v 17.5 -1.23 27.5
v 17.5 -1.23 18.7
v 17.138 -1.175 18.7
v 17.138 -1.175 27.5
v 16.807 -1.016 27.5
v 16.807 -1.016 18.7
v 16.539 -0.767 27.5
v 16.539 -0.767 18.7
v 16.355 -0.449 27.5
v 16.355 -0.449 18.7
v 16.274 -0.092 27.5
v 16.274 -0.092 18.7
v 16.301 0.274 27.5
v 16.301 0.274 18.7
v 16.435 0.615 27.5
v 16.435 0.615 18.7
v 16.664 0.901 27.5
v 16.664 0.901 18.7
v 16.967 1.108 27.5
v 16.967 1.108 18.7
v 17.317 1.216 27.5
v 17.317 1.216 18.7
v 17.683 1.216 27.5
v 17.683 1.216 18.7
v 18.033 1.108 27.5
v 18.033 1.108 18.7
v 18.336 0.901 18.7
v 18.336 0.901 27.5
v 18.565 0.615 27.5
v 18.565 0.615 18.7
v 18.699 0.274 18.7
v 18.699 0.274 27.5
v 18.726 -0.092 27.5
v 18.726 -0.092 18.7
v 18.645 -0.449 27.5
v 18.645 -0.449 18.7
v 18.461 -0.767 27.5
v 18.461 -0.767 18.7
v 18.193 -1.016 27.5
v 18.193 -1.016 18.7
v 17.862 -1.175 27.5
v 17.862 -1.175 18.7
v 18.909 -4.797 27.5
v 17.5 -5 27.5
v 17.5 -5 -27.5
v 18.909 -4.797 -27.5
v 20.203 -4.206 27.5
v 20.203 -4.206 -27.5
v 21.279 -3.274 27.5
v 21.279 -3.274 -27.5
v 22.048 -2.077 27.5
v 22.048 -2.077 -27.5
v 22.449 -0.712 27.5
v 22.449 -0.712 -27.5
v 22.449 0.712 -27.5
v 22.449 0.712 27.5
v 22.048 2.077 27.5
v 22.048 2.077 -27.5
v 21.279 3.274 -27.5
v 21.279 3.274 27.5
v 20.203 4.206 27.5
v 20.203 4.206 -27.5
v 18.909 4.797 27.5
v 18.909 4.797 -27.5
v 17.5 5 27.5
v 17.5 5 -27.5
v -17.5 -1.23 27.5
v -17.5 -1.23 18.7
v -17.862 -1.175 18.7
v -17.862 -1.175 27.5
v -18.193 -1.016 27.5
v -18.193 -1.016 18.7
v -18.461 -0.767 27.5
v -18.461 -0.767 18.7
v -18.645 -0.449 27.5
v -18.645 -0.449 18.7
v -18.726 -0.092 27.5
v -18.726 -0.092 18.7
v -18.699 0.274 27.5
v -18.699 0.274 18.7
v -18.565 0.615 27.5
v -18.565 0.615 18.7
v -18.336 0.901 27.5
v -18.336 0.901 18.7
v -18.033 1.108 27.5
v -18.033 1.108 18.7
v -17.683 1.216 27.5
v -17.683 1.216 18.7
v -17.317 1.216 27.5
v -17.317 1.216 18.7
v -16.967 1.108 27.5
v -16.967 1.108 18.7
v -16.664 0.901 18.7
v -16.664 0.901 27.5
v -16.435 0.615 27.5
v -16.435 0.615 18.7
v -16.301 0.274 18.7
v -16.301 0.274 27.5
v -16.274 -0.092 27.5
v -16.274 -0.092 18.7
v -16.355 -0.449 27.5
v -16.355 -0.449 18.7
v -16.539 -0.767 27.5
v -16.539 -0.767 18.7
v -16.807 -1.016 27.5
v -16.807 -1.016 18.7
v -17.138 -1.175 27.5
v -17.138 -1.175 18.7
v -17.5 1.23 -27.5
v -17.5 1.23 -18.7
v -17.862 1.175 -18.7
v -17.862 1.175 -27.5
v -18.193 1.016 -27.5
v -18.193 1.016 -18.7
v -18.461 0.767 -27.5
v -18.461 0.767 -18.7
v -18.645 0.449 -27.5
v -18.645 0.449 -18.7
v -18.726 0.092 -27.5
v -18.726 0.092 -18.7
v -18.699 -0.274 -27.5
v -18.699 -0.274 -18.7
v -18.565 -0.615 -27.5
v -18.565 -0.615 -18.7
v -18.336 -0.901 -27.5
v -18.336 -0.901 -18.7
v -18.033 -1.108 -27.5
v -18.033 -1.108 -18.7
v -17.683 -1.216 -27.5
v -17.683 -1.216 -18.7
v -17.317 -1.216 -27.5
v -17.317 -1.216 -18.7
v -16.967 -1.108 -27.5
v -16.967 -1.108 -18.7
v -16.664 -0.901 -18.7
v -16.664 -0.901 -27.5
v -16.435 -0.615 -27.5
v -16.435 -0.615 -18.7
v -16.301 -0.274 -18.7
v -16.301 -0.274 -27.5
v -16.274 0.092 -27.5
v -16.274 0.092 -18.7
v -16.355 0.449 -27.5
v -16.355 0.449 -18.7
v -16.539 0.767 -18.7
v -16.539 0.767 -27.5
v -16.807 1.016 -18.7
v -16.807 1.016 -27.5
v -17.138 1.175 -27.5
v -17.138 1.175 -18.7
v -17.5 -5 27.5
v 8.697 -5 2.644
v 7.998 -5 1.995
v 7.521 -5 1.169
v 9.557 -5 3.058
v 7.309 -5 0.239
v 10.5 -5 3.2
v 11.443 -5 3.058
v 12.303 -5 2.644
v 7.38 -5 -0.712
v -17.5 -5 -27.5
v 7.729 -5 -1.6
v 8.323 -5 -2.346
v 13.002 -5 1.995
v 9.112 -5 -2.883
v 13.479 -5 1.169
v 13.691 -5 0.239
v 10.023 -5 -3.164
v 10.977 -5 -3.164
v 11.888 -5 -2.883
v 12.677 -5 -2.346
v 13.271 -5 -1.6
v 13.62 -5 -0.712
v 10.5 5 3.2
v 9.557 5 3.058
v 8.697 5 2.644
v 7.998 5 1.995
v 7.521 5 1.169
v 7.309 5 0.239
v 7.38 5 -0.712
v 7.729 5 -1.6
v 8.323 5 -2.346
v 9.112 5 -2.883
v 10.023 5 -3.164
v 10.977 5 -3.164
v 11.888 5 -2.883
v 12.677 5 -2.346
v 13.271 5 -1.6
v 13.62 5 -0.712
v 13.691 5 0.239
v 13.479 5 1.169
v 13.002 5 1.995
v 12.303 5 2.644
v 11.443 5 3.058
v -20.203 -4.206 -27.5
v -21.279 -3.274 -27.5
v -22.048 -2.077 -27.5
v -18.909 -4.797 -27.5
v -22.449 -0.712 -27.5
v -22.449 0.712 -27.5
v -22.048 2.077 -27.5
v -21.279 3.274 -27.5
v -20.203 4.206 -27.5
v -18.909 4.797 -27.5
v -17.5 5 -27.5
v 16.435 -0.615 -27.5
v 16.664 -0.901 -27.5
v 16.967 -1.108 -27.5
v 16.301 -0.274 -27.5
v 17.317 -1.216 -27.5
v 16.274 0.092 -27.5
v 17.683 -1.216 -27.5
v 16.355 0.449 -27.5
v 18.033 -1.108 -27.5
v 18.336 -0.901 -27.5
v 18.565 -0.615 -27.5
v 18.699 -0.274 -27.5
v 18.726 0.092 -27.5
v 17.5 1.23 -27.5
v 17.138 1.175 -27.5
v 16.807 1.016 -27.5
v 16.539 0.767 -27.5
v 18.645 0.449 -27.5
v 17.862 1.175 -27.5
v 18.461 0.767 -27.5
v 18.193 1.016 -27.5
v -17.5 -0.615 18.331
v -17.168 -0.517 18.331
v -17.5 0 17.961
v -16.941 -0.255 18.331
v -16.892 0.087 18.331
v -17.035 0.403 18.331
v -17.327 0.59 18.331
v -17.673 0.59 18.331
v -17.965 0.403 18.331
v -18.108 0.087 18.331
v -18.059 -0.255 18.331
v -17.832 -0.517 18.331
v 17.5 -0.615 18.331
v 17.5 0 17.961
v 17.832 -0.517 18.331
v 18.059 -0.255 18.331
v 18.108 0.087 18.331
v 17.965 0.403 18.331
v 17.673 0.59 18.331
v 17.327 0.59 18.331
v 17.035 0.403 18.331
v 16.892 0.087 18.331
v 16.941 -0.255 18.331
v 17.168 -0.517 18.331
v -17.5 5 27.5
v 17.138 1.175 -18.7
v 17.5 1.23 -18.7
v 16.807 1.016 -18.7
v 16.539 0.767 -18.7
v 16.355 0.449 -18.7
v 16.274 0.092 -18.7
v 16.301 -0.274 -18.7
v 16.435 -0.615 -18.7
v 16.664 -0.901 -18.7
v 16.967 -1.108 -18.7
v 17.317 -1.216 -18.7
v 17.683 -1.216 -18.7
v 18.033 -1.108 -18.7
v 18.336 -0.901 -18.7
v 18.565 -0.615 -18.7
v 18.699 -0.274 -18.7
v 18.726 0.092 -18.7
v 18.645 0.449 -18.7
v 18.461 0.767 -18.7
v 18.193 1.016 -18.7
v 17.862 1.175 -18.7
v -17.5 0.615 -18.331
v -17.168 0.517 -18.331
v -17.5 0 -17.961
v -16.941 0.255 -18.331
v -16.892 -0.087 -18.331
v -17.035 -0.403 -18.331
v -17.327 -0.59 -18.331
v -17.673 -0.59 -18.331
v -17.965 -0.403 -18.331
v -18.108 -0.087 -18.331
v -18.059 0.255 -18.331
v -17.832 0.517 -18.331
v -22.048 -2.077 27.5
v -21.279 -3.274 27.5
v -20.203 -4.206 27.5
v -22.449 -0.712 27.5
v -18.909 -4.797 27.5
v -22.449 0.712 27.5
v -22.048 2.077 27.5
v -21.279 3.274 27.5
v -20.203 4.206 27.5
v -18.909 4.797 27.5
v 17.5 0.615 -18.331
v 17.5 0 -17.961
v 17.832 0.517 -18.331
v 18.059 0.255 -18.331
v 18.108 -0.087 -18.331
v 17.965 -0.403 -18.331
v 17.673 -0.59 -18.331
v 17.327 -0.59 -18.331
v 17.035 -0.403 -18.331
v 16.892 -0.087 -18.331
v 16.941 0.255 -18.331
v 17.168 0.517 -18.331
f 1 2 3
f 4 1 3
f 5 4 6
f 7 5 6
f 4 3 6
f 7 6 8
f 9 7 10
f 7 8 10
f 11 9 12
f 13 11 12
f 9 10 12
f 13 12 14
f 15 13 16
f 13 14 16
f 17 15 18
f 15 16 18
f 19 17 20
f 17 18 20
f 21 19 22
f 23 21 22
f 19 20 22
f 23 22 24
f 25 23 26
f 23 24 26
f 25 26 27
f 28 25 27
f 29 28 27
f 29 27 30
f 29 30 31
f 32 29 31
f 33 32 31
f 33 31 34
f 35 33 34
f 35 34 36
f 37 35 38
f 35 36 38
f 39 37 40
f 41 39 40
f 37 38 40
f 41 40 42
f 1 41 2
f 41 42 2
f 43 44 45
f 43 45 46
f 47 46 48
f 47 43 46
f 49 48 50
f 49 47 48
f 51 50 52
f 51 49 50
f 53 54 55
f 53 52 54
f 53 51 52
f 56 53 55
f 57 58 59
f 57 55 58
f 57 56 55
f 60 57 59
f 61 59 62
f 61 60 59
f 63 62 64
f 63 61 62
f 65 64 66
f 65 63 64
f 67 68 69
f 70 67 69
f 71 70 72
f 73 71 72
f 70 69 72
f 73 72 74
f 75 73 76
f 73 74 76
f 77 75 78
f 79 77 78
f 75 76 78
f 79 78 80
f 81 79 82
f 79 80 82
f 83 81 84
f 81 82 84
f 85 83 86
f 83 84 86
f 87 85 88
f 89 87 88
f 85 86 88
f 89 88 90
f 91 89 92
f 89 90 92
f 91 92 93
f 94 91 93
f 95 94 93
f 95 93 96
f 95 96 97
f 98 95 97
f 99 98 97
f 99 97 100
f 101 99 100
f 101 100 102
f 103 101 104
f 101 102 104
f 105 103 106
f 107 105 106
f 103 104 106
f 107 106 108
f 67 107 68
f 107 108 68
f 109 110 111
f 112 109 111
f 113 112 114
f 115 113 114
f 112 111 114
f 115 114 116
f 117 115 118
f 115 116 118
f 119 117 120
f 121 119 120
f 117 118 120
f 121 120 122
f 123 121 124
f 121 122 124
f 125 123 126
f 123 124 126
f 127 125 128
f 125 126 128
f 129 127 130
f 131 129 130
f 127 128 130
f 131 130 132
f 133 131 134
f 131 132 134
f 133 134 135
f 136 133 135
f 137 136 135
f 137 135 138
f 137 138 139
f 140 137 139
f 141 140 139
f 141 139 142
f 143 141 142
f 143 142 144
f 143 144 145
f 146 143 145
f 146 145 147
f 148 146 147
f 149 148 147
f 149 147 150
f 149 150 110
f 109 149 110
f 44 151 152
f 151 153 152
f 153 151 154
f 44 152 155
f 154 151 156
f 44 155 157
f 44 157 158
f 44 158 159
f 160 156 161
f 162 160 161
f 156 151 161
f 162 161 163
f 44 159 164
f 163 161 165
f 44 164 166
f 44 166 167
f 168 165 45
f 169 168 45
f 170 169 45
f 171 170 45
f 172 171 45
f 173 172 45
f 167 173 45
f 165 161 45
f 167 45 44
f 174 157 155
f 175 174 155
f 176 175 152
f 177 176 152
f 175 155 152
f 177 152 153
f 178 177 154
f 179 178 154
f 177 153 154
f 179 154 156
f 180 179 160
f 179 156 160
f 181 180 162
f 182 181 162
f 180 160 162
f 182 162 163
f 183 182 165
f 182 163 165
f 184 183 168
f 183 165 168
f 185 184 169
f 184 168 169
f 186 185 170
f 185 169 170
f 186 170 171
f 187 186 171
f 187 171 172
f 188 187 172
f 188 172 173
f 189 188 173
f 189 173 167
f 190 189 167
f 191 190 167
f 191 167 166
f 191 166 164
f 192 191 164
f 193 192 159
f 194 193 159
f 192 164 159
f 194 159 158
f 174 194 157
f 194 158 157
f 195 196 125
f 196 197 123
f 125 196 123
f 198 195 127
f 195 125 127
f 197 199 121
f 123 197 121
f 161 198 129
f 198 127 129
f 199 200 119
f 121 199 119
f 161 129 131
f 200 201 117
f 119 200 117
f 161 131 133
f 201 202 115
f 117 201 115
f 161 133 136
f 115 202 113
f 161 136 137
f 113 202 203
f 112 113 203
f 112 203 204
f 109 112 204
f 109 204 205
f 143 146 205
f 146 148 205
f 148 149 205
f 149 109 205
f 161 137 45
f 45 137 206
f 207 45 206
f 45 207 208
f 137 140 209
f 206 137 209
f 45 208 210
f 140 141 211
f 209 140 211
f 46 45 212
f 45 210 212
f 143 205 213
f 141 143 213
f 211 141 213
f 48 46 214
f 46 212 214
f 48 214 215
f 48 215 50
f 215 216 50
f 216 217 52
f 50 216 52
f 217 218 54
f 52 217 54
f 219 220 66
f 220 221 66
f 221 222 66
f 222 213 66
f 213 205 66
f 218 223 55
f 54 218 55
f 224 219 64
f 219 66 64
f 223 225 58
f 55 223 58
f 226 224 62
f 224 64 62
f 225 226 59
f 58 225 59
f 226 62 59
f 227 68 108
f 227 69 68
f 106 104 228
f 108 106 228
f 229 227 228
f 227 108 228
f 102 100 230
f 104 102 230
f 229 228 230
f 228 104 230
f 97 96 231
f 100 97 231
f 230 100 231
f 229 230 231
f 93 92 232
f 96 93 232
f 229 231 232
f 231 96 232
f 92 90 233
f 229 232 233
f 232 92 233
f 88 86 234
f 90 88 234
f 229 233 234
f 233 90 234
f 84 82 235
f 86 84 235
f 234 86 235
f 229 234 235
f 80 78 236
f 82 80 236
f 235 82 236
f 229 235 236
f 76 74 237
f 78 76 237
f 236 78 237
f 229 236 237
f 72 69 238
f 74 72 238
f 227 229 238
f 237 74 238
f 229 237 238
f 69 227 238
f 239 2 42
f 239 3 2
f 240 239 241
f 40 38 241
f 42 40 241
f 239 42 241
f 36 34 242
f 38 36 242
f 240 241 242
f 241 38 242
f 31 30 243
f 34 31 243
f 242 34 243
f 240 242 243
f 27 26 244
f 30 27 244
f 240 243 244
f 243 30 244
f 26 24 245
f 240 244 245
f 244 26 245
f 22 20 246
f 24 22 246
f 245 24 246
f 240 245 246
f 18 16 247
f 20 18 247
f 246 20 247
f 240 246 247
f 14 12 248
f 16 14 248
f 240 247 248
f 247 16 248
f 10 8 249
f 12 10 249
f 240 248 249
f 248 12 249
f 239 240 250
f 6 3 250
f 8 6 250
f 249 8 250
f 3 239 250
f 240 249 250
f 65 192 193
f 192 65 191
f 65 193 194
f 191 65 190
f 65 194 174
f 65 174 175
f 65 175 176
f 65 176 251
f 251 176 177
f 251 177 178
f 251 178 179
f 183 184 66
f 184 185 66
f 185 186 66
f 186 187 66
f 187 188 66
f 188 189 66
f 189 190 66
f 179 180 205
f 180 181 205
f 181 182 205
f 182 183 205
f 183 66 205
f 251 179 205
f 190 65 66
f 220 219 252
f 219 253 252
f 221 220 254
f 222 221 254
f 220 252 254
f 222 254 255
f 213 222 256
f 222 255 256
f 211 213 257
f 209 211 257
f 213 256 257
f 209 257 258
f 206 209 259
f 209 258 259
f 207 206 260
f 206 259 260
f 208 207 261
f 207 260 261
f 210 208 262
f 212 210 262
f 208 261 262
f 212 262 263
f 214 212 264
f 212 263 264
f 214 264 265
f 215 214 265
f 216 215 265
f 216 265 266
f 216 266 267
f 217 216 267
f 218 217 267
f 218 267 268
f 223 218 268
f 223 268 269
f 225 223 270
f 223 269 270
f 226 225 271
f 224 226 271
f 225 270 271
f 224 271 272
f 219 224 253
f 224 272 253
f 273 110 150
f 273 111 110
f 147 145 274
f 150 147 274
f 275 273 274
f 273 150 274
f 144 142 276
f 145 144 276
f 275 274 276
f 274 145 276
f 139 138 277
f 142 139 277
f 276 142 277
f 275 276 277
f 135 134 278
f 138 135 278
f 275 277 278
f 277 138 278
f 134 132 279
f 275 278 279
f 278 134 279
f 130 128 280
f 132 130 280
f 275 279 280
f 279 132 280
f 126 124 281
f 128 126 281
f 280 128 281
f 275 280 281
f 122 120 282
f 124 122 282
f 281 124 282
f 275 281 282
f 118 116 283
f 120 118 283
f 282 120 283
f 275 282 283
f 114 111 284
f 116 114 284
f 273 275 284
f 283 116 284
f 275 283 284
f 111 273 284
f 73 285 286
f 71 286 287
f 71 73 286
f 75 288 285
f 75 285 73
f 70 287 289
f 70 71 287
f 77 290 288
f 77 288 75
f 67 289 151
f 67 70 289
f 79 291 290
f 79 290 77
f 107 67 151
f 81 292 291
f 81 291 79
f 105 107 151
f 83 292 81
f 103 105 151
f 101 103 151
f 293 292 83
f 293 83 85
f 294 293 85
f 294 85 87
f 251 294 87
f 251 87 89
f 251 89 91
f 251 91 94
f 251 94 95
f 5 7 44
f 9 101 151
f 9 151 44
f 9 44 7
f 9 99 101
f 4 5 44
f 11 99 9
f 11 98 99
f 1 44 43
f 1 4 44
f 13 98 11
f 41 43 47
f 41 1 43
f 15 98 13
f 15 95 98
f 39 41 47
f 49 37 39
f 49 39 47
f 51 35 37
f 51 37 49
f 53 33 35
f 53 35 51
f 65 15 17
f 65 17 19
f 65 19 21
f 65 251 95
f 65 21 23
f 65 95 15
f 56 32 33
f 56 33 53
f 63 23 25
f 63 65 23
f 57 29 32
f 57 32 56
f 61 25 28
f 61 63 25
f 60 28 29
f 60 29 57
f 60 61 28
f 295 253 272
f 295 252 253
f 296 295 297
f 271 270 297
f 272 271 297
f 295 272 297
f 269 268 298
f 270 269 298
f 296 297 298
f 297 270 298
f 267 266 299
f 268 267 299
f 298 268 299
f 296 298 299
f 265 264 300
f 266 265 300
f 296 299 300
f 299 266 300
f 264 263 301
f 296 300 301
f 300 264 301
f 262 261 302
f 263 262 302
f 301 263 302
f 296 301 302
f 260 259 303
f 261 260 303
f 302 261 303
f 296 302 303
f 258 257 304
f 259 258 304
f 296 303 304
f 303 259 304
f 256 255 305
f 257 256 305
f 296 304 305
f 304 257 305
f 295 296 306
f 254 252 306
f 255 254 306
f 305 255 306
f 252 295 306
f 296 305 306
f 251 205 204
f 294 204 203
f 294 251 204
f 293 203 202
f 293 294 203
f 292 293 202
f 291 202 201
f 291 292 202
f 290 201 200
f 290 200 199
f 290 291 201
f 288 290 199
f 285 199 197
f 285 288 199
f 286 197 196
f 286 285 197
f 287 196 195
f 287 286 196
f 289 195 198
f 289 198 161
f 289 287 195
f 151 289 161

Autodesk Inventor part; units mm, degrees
ref_plane "YZ Plane" through (0, 0, 0) normal (1, 0, 0) x (0, 1, 0)
ref_plane "XZ Plane" through (0, 0, 0) normal (0, 1, 0) x (-1, 0, 0)
ref_plane "XY Plane" through (0, 0, 0) normal (0, 0, 1) x (1, 0, 0)
sketch "スケッチ1" plane through (0, 0, 0) normal (0, 0, 1) x (1, 0, 0)
  line L0 (-22.5, -5) -> (22.5, -5)
  line L1 (22.5, -5) -> (22.5, 5)
  line L2 (22.5, 5) -> (-22.5, 5)
  line L3 (-22.5, 5) -> (-22.5, -5)
  line L4 (-22.5, -5) -> (22.5, 5) construction
  line L5 (22.5, -5) -> (-22.5, 5) construction
  point P0 (0, 0)
  dimension "d0" = 45
  dimension "d1" = 10
extrude "押し出し1" add sketch "スケッチ1" along normal mid plane 55
sketch "スケッチ2" plane through (0, 0, 27.5) normal (0, 0, 1) x (1, 0, 0)
  line L0 (22.5, 5) -> (-22.5, 5) projected
  line L1 (-22.5, 5) -> (-22.5, -5) projected
  line L2 (22.5, -5) -> (22.5, 5) projected
  point P0 (0, 0)
  point P1 (-17.5, 0)
  point P2 (17.5, 0)
  dimension "d4" = 5
  dimension "d5" = 5
  dimension "d6" = 5
  dimension "d7" = 5
hole "穴1" at (-17.5, 0, 27.5) at (17.5, 0, 27.5) direction (0, 0, -1) diameter 2.459 depth 8.8 tip angle 118 thread size "M3x0.5" class "6H" standard "ISO Metric profile"
sketch "スケッチ3" plane through (0, 0, -27.5) normal (0, 0, -1) x (-1, 0, 0)
  line L0 (-22.5, 5) -> (-22.5, -5) projected
  line L1 (-22.5, -5) -> (22.5, -5) projected
  line L2 (22.5, -5) -> (22.5, 5) projected
  line L3 (22.5, 5) -> (-22.5, 5) projected
  circle A0 centre (-17.5, 0) radius 1.2295 projected
  circle A1 centre (17.5, 0) radius 1.2295 projected
  point P0 (0, 0)
hole "穴2" at (17.5, 0, -27.5) at (-17.5, 0, -27.5) direction (0, 0, 1) diameter 2.459 depth 8.8 tip angle 118 thread size "M3x0.5" class "6H" standard "ISO Metric profile"
sketch "スケッチ4" plane through (-22.5, 5, 27.5) normal (0, 1, 0) x (1, 0, 0)
  line L0 (45, 55) -> (45, 0) projected
  line L1 (45, 0) -> (0, 0) projected
  point P0 (22.5, 27.5)
  point P1 (33, 27.5)
  dimension "d22" = 12
  dimension "d23" = 27.5
hole "穴3" at (10.5, 5, 0) direction (0, -1, 0) diameter 6.4 end through all
sketch "スケッチ5" plane through (0, 0, 27.5) normal (0, 0, 1) x (1, 0, 0)
  circle A0 centre (17.5, 0) radius 1.2295 projected
  circle A1 centre (-17.5, 0) radius 1.2295 projected
  line L0 (22.5, -5) -> (22.5, 5) projected
  line L1 (22.5, 5) -> (-22.5, 5) projected
  line L2 (-22.5, 5) -> (-22.5, -5) projected
  line L3 (-22.5, -5) -> (22.5, -5) projected
  line L4 (-17.5, 0) -> (17.5, 0) construction
  line L5 (-17.5, -5) -> (17.5, -5)
  line L6 (17.5, 5) -> (-17.5, 5)
  arc A2 (-17.5, 5) -> (-17.5, -5) centre (-17.5, 0) ccw
  arc A3 (17.5, -5) -> (17.5, 5) centre (17.5, 0) ccw
  point P0 (0, 0)
  point P1 (0, 0)
  point P2 (22.5, 0)
  point P3 (-22.5, 0)
extrude "押し出し2" cut sketch "スケッチ5" against normal through all contours L3 A3 L0 | A3 L1 L0 | L3 L2 A2 | A2 L2 L1
equation "\"d5\" = d4"
equation "\"d6\" = d4"
equation "\"d7\" = d4"
properties part number "camera_connect_part"
